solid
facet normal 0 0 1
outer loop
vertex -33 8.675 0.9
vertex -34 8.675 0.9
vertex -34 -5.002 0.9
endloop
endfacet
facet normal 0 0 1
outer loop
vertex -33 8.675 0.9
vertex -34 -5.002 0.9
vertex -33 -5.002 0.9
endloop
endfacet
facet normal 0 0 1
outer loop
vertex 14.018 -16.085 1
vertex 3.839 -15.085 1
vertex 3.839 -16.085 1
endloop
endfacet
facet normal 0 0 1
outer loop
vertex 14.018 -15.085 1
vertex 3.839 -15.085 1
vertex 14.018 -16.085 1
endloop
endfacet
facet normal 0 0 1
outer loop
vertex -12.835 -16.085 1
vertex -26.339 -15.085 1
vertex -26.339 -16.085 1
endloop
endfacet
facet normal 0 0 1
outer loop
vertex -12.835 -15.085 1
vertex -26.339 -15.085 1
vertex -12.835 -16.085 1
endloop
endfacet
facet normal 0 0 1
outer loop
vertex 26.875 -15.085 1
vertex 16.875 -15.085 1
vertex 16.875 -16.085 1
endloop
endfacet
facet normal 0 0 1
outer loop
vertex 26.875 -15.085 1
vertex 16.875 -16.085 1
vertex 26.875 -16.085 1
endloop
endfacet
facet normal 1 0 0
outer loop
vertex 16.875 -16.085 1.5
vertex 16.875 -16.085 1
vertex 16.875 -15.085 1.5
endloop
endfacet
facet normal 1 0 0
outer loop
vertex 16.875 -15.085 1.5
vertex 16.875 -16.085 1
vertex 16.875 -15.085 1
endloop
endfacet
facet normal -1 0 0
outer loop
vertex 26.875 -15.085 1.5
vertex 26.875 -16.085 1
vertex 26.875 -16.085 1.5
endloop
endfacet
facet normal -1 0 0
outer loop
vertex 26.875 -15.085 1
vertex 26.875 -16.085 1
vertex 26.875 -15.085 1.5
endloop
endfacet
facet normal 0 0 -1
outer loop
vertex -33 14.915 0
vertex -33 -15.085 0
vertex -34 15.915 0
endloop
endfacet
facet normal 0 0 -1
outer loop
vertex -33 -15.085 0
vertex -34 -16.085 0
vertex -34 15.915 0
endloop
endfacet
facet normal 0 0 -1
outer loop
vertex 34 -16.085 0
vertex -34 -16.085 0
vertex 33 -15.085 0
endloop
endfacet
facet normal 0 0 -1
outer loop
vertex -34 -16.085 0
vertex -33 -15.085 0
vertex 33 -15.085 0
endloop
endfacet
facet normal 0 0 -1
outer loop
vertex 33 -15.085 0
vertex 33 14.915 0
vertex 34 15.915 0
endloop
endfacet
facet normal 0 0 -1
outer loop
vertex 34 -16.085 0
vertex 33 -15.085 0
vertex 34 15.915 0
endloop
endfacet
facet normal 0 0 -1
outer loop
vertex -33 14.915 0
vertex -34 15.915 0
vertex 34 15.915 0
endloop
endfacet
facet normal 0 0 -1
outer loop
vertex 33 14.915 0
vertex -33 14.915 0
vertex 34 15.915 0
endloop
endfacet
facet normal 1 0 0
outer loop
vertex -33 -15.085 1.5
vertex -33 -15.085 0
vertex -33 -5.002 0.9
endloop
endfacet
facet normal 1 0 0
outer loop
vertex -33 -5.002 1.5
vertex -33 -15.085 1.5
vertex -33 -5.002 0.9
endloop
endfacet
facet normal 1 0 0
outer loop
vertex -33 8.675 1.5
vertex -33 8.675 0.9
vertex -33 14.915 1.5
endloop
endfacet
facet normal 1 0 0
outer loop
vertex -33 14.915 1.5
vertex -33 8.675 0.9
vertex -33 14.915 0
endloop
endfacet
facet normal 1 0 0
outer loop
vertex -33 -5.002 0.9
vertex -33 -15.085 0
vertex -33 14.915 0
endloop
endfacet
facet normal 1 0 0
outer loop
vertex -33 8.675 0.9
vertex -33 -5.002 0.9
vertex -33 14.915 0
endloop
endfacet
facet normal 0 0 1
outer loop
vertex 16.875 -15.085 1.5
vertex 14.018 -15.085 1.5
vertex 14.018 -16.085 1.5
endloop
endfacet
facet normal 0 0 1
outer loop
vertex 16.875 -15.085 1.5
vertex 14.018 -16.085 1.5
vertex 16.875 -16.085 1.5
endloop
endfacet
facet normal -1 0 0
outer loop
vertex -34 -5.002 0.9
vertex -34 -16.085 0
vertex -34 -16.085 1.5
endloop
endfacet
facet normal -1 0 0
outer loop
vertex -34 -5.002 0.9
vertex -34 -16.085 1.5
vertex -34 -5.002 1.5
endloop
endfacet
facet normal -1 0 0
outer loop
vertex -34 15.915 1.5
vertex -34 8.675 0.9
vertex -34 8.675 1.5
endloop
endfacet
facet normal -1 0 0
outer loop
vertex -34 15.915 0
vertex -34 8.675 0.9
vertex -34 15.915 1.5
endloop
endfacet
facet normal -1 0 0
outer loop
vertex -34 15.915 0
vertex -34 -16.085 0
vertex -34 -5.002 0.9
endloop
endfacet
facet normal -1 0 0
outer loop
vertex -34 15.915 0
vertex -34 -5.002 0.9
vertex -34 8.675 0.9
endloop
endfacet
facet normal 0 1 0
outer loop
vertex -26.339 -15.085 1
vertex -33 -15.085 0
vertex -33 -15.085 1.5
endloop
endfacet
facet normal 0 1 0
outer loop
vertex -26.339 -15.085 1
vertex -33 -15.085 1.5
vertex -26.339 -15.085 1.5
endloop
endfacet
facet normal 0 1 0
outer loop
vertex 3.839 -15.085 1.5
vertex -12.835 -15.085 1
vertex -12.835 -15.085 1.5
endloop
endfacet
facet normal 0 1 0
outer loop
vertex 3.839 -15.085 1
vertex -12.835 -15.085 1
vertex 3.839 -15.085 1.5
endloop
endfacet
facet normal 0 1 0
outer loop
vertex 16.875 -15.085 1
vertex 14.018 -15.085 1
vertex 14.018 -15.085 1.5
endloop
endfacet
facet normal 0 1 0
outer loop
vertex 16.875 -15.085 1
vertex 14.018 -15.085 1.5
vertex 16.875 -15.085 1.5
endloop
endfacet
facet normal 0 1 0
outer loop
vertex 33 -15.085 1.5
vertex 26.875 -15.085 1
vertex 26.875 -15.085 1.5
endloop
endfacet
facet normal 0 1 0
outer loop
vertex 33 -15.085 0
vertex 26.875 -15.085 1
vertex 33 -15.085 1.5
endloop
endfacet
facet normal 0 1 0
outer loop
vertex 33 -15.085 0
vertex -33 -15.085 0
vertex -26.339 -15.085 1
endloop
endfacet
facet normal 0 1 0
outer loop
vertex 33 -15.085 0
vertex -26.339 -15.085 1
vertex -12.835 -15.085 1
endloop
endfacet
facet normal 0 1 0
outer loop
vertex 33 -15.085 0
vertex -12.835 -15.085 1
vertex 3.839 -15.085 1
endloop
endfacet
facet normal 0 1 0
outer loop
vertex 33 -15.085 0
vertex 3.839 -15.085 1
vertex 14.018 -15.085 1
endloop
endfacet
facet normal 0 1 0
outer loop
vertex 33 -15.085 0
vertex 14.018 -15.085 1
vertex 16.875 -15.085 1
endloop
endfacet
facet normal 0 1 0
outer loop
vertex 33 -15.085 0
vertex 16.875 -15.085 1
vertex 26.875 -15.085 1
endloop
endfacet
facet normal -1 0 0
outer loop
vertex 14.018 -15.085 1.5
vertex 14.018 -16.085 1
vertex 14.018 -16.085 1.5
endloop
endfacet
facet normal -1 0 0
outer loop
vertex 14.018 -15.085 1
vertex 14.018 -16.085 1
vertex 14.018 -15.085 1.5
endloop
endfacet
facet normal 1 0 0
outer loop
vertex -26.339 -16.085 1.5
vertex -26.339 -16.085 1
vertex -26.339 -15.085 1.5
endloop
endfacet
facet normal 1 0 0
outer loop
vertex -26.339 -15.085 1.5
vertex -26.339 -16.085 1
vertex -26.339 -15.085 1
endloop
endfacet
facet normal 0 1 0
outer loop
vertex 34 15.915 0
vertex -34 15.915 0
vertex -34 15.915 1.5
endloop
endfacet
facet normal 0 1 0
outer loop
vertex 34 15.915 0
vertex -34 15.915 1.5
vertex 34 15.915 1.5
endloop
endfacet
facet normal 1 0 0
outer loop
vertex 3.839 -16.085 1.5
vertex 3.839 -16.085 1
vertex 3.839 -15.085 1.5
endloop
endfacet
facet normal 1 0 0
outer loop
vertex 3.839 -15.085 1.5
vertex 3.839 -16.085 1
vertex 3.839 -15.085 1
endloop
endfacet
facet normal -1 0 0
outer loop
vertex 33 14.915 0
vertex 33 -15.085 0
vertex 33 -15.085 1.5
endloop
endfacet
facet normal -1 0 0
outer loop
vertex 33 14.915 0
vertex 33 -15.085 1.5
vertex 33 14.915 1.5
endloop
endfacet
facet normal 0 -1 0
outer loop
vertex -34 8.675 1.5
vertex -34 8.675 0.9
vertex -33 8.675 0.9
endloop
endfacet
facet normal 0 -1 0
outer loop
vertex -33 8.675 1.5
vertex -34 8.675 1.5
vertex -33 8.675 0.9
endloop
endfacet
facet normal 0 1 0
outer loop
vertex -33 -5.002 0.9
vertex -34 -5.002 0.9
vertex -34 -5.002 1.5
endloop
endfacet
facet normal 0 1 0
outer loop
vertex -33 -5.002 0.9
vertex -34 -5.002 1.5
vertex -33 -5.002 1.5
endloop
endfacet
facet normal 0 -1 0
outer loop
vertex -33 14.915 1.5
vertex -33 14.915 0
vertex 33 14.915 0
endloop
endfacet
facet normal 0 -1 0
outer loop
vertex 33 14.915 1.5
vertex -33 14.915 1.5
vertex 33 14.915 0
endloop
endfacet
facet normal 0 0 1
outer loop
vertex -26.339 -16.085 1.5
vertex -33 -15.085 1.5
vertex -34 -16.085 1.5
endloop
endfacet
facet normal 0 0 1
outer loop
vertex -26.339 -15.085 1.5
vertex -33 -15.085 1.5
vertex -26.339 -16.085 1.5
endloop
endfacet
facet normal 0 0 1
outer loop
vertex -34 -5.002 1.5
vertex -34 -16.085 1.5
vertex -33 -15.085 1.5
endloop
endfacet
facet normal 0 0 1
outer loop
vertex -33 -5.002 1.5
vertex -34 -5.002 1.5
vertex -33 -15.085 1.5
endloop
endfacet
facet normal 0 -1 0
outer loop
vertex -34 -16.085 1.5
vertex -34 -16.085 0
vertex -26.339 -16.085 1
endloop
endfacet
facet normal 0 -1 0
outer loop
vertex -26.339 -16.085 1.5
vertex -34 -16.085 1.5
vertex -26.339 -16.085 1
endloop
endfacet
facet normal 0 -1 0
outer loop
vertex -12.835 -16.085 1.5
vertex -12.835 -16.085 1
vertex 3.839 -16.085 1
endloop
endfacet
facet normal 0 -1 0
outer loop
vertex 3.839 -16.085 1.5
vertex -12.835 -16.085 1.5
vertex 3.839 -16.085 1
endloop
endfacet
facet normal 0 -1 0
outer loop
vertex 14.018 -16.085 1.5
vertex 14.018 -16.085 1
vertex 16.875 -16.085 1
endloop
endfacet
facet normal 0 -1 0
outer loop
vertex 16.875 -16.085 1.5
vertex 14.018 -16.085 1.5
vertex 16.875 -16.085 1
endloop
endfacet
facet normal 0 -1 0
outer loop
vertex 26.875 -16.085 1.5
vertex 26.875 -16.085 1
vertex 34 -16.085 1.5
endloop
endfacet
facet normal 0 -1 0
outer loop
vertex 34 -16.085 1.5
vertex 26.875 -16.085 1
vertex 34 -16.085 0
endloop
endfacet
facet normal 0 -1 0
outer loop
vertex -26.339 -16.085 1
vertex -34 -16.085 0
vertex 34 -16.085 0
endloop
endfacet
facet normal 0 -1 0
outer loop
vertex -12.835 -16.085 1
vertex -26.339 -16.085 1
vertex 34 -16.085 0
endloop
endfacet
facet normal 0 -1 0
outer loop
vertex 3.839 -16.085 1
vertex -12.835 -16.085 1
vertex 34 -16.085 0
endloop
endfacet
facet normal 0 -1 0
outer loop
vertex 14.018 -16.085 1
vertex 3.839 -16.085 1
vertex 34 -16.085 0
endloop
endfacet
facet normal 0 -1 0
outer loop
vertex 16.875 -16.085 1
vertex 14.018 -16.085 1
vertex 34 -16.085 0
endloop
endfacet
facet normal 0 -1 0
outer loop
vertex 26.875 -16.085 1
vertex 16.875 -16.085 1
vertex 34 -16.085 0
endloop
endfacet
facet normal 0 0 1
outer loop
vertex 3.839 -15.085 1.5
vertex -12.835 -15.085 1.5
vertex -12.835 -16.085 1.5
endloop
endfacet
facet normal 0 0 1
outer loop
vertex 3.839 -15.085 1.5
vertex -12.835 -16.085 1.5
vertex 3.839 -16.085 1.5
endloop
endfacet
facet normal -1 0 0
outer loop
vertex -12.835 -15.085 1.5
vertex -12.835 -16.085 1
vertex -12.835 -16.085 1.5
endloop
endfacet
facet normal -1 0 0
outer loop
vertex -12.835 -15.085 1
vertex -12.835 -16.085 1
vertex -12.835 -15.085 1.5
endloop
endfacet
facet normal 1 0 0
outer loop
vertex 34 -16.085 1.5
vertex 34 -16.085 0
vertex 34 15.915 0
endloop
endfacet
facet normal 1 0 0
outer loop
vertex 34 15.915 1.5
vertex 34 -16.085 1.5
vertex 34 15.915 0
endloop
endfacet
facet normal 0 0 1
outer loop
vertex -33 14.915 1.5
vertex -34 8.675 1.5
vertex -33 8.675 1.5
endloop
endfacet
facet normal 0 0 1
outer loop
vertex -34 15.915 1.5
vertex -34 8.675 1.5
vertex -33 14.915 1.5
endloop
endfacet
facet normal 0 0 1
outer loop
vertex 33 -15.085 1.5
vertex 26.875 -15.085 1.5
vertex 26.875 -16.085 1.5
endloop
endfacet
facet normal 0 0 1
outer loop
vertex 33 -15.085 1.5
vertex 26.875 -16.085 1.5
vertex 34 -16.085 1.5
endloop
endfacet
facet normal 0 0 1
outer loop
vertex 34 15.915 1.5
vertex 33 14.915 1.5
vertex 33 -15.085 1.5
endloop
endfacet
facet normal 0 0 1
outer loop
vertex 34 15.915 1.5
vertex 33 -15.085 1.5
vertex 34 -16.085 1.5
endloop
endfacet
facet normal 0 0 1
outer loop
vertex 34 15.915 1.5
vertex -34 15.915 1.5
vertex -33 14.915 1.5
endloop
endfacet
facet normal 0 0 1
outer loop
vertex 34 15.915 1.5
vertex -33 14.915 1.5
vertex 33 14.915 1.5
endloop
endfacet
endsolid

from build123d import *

# Parameters (mm, degrees)
F0_W     = 68
F0_H     = 32
F0_W_2   = 66.0000007396
F0_H_2   = 30
F2_DEPTH = 1.5
F5_START = 0.9
F3_W     = 9.7086578608
F3_H     = 13.6771607213
F5_DEPTH = 2.3
F6_START = 1
F1_W     = 13.5039854795
F1_H     = 7.9890675843
F1_W_2   = 10.1785697043
F1_W_3   = 10.0000035018
F1_H_2   = 7.8571438789
F6_DEPTH = 4.6
F7_START = 1.5
F4_W     = 54.7266360372
F4_H     = 8.1930877641
F7_DEPTH = 4


with BuildPart() as f2:
    # F0 (on Top) → F2 (new body)
    with BuildSketch(Plane.XY):
        with Locations((0, -0.0852976367)):
            Rectangle(F0_W, F0_H)
        with Locations((0, -0.0852976367)):
            Rectangle(F0_W_2, F0_H_2, mode=Mode.SUBTRACT)
    extrude(amount=F2_DEPTH)

    # F3 (on Top) → F5 (cut)
    with BuildSketch(Plane.XY.offset(F5_START)):
        with Locations((-30.4173231125, 1.8361529801)):
            Rectangle(F3_W, F3_H)
    extrude(amount=F5_DEPTH, mode=Mode.SUBTRACT)

    # F1 (on Top) → F6 (cut)
    with BuildSketch(Plane.XY.offset(F6_START)):
        with Locations((-19.5872941986, -13.5481059551)):
            Rectangle(F1_W, F1_H)
        with Locations((8.9285718277, -13.5481059551)):
            Rectangle(F1_W_2, F1_H)
        with Locations((21.8750005588, -13.4821441025)):
            Rectangle(F1_W_3, F1_H_2)
    extrude(amount=F6_DEPTH, mode=Mode.SUBTRACT)

    # F4 (on Top) → F7 (cut)
    with BuildSketch(Plane.XY.offset(F7_START)):
        with Locations((0.0114953145, 13.3686042391)):
            Rectangle(F4_W, F4_H)
    extrude(amount=F7_DEPTH, mode=Mode.SUBTRACT)


solid = f2.part
